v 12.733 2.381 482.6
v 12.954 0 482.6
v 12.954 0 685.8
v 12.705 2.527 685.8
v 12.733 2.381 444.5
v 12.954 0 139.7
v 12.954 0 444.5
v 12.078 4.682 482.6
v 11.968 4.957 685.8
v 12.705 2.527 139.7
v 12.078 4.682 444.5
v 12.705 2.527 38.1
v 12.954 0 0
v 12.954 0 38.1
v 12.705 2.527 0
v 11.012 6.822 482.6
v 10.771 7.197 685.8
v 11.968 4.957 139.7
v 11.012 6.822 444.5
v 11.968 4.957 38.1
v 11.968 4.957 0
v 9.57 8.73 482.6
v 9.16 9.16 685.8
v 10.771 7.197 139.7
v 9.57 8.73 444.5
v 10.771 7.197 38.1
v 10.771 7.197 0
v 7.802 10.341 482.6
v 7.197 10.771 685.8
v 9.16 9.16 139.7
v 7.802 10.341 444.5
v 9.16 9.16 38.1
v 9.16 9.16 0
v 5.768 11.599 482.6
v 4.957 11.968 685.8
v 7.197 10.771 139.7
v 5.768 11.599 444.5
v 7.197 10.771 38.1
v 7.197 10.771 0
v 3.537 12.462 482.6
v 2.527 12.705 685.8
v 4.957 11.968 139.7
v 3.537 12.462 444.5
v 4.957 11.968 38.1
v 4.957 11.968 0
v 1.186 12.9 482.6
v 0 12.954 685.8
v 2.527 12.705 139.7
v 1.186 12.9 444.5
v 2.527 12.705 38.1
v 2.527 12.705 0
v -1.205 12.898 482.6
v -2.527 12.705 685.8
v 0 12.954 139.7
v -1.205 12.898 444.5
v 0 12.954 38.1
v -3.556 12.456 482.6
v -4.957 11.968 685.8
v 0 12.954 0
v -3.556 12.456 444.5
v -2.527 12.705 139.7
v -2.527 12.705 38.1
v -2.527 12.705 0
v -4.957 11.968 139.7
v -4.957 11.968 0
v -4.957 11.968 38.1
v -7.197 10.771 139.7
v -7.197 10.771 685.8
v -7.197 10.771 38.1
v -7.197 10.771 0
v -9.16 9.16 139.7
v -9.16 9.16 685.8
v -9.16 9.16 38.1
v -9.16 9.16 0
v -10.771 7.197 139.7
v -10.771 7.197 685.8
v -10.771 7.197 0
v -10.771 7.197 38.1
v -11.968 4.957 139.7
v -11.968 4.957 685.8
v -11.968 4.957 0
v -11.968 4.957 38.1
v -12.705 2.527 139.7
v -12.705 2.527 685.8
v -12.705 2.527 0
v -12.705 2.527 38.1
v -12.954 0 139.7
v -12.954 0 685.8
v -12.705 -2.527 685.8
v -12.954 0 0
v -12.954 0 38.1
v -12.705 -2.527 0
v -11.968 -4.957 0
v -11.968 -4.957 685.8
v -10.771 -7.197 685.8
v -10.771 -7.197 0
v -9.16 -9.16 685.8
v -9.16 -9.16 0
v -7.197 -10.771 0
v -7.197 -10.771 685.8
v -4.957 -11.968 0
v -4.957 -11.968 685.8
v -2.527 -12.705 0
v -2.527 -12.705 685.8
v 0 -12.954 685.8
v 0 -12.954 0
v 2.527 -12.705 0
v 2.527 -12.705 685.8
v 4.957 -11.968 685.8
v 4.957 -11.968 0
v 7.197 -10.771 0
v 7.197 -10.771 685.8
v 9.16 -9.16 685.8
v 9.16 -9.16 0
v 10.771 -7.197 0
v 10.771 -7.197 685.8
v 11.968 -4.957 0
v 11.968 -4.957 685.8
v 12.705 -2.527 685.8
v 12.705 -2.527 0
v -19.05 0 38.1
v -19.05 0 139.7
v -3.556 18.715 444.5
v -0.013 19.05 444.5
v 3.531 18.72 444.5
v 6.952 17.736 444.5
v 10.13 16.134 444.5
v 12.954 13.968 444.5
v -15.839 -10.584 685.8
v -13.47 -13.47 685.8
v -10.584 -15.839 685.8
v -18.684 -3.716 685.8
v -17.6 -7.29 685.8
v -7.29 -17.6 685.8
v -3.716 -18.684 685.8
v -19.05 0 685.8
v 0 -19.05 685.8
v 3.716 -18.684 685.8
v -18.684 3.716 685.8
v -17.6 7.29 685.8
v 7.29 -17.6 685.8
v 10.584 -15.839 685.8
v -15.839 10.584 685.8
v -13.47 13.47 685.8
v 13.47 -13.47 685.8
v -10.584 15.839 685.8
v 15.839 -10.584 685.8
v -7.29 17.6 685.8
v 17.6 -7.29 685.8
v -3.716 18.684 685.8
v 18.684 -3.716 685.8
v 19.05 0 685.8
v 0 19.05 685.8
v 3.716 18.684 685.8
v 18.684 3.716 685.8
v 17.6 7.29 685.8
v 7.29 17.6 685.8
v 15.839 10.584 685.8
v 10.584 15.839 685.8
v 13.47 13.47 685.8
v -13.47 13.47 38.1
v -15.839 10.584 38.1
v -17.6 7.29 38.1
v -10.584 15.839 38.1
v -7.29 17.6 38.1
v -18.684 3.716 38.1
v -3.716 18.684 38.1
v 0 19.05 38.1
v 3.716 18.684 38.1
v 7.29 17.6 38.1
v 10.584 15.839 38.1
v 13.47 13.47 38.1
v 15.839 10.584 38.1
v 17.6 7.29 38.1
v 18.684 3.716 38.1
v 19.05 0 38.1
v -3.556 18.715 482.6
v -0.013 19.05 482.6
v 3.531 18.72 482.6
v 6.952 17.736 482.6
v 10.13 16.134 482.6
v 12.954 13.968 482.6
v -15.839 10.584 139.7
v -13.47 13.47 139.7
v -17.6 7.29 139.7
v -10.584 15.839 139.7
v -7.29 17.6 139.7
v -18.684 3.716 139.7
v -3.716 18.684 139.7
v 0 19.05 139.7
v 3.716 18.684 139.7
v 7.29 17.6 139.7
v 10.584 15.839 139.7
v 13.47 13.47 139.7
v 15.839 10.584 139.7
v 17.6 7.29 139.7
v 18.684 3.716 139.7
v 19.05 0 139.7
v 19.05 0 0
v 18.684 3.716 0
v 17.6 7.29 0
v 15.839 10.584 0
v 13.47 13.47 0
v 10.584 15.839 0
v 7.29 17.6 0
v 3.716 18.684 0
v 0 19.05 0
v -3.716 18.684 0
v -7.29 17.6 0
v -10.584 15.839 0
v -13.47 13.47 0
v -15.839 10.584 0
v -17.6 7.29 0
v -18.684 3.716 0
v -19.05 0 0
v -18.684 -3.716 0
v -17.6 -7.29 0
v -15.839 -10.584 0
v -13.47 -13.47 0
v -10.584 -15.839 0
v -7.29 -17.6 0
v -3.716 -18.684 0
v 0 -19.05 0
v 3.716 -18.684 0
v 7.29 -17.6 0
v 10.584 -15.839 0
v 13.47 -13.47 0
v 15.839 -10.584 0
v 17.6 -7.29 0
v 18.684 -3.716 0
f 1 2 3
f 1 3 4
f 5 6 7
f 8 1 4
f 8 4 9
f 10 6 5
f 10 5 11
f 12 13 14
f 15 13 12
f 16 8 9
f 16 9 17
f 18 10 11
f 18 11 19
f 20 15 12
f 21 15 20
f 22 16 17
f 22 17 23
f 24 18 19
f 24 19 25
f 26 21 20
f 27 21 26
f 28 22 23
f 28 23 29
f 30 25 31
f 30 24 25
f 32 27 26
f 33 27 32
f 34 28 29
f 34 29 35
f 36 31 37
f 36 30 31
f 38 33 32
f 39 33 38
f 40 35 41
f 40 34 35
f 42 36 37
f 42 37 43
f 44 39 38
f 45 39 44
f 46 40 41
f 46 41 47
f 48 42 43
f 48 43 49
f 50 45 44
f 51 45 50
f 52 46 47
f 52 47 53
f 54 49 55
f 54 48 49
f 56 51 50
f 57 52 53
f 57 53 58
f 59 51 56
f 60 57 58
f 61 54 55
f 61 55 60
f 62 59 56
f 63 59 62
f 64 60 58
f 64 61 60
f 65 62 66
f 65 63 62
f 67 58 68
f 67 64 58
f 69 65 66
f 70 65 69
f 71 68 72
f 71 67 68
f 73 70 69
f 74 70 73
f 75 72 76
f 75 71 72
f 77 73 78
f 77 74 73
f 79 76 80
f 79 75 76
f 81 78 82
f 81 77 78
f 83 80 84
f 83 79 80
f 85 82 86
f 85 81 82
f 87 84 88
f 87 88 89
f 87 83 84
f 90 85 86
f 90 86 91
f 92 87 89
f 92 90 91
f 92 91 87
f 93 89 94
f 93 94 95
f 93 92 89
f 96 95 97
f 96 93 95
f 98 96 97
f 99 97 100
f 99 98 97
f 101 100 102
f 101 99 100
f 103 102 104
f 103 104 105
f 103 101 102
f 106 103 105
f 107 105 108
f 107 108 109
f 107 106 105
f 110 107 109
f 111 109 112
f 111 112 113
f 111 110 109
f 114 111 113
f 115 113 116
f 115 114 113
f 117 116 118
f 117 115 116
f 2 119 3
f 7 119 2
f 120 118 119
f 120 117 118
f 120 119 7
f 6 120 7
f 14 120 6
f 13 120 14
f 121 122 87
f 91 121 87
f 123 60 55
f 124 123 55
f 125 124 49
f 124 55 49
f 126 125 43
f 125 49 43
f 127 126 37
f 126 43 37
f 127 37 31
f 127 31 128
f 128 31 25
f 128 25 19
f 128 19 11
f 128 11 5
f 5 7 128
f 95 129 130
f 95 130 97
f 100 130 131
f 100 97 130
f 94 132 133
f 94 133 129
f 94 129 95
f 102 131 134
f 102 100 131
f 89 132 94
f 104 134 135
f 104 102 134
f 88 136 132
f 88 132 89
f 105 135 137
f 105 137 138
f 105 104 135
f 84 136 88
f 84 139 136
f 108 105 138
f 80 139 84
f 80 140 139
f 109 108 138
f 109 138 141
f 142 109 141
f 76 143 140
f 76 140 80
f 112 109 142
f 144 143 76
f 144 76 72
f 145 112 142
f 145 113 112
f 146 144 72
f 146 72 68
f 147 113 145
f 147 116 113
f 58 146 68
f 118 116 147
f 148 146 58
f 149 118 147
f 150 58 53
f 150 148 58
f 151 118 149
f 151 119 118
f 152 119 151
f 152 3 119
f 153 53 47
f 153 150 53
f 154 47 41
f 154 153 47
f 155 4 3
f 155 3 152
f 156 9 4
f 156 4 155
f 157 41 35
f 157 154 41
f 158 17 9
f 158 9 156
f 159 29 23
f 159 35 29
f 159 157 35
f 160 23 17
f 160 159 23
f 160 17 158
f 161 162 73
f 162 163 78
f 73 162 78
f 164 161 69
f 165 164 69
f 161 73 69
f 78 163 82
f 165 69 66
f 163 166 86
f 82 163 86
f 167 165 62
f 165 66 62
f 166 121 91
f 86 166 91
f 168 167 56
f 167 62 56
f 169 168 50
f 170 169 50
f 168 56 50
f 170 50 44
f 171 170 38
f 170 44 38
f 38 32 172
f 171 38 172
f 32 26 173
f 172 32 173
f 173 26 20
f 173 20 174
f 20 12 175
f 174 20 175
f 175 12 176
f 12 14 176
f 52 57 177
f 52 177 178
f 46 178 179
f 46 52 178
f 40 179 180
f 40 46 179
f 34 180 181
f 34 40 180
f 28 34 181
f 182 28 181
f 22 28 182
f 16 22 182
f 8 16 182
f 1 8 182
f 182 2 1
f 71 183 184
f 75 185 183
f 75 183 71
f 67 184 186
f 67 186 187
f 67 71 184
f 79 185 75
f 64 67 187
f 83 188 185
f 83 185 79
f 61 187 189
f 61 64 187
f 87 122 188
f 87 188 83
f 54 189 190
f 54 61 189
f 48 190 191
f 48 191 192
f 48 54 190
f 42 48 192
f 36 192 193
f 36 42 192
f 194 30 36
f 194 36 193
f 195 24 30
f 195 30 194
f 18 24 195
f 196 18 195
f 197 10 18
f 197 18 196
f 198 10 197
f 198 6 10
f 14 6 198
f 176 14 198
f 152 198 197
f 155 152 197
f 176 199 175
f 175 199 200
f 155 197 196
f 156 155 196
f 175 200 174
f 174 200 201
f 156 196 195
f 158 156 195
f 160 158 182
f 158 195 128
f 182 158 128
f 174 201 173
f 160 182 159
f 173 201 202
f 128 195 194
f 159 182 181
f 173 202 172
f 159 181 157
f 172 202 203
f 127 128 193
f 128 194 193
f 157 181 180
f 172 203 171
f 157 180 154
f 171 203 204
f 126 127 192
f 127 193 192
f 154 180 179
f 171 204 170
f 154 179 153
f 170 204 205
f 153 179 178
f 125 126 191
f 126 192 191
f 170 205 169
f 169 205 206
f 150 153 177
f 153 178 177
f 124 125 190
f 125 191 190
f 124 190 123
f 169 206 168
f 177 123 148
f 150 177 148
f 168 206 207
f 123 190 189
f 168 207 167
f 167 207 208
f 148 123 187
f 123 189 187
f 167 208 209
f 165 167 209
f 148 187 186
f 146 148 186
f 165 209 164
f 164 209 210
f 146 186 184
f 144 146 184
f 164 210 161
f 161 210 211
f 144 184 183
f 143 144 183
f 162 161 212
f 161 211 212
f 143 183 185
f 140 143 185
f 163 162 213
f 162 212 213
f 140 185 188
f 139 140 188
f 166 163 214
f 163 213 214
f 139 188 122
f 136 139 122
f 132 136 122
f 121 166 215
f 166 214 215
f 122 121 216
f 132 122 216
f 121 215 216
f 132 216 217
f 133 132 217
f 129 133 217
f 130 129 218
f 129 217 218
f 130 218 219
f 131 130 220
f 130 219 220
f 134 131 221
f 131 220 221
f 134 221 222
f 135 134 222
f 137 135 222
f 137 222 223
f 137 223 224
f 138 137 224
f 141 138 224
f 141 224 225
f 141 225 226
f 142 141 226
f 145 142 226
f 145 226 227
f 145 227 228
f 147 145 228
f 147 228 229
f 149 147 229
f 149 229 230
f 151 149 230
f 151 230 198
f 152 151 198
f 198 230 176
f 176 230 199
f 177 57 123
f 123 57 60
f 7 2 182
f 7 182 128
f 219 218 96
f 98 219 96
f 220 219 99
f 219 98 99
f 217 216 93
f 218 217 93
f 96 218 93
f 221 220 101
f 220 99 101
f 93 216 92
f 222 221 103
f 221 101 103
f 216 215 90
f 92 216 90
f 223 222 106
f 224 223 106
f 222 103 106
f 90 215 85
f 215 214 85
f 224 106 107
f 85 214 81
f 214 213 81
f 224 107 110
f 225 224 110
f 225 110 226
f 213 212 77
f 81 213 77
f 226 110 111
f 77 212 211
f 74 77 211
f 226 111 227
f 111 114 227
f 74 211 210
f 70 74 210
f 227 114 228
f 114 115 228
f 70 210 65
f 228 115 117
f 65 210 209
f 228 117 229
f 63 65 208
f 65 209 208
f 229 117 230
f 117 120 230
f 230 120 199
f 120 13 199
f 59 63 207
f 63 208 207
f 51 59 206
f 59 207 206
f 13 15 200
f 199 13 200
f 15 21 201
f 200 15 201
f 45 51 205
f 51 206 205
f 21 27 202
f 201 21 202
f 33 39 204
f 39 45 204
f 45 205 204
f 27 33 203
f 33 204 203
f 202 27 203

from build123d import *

# Parameters (mm, degrees)
SKETCH2_R               = 19.05
SKETCH2_R_2             = 12.954
BOSS_EXTRUDE1_DEPTH     = 685.8
CUT_EXTRUDE1_REACH      = 688.329
SKETCH3_W               = 50.8
SKETCH3_H               = 101.6
CUT_EXTRUDE2_REACH      = 688.329
CUT_EXTRUDE2_END_RADIUS = 19.05
SKETCH4_W               = 16.51
SKETCH4_H               = 38.1


with BuildPart() as part:
    # Sketch2 → Boss-Extrude1 (new body)
    with BuildSketch(Plane.XY):
        Circle(SKETCH2_R)
        Circle(SKETCH2_R_2, mode=Mode.SUBTRACT)
    extrude(amount=BOSS_EXTRUDE1_DEPTH)

    # Sketch3 → Cut-Extrude1 (cut, up to next)
    with BuildSketch(Plane(origin=(0, 0, 0), x_dir=(1, 0, 0), z_dir=(0, 1, 0)), mode=Mode.PRIVATE) as cut_extrude1_sk1:
        with Locations((0, -88.9)):
            Rectangle(SKETCH3_W, SKETCH3_H)
    cut_extrude1_tool1 = extrude(cut_extrude1_sk1.sketch, amount=CUT_EXTRUDE1_REACH, mode=Mode.PRIVATE) & part.part
    add(cut_extrude1_tool1.solids().sort_by_distance((0, 0, 88.9))[0], mode=Mode.SUBTRACT)

    # Cut-Extrude2: up to this cylinder (the profile starts inside it)
    cut_extrude2_end = Plane(origin=(0, 0, 463.55), z_dir=(0, 0, -1)) * Cylinder(CUT_EXTRUDE2_END_RADIUS, 1415.758, mode=Mode.PRIVATE)
    # Sketch4 → Cut-Extrude2 (cut, up to the surface)
    with BuildSketch(Plane(origin=(0, 0, 0), x_dir=(1, 0, 0), z_dir=(0, 1, 0)), mode=Mode.PRIVATE) as cut_extrude2_sk1:
        with Locations((4.699, -463.55)):
            Rectangle(SKETCH4_W, SKETCH4_H)
    cut_extrude2_tool1 = extrude(cut_extrude2_sk1.sketch, amount=CUT_EXTRUDE2_REACH, mode=Mode.PRIVATE) & cut_extrude2_end
    add(cut_extrude2_tool1.solids().sort_by_distance((4.699, 0, 463.55))[0], mode=Mode.SUBTRACT)


solid = part.part
